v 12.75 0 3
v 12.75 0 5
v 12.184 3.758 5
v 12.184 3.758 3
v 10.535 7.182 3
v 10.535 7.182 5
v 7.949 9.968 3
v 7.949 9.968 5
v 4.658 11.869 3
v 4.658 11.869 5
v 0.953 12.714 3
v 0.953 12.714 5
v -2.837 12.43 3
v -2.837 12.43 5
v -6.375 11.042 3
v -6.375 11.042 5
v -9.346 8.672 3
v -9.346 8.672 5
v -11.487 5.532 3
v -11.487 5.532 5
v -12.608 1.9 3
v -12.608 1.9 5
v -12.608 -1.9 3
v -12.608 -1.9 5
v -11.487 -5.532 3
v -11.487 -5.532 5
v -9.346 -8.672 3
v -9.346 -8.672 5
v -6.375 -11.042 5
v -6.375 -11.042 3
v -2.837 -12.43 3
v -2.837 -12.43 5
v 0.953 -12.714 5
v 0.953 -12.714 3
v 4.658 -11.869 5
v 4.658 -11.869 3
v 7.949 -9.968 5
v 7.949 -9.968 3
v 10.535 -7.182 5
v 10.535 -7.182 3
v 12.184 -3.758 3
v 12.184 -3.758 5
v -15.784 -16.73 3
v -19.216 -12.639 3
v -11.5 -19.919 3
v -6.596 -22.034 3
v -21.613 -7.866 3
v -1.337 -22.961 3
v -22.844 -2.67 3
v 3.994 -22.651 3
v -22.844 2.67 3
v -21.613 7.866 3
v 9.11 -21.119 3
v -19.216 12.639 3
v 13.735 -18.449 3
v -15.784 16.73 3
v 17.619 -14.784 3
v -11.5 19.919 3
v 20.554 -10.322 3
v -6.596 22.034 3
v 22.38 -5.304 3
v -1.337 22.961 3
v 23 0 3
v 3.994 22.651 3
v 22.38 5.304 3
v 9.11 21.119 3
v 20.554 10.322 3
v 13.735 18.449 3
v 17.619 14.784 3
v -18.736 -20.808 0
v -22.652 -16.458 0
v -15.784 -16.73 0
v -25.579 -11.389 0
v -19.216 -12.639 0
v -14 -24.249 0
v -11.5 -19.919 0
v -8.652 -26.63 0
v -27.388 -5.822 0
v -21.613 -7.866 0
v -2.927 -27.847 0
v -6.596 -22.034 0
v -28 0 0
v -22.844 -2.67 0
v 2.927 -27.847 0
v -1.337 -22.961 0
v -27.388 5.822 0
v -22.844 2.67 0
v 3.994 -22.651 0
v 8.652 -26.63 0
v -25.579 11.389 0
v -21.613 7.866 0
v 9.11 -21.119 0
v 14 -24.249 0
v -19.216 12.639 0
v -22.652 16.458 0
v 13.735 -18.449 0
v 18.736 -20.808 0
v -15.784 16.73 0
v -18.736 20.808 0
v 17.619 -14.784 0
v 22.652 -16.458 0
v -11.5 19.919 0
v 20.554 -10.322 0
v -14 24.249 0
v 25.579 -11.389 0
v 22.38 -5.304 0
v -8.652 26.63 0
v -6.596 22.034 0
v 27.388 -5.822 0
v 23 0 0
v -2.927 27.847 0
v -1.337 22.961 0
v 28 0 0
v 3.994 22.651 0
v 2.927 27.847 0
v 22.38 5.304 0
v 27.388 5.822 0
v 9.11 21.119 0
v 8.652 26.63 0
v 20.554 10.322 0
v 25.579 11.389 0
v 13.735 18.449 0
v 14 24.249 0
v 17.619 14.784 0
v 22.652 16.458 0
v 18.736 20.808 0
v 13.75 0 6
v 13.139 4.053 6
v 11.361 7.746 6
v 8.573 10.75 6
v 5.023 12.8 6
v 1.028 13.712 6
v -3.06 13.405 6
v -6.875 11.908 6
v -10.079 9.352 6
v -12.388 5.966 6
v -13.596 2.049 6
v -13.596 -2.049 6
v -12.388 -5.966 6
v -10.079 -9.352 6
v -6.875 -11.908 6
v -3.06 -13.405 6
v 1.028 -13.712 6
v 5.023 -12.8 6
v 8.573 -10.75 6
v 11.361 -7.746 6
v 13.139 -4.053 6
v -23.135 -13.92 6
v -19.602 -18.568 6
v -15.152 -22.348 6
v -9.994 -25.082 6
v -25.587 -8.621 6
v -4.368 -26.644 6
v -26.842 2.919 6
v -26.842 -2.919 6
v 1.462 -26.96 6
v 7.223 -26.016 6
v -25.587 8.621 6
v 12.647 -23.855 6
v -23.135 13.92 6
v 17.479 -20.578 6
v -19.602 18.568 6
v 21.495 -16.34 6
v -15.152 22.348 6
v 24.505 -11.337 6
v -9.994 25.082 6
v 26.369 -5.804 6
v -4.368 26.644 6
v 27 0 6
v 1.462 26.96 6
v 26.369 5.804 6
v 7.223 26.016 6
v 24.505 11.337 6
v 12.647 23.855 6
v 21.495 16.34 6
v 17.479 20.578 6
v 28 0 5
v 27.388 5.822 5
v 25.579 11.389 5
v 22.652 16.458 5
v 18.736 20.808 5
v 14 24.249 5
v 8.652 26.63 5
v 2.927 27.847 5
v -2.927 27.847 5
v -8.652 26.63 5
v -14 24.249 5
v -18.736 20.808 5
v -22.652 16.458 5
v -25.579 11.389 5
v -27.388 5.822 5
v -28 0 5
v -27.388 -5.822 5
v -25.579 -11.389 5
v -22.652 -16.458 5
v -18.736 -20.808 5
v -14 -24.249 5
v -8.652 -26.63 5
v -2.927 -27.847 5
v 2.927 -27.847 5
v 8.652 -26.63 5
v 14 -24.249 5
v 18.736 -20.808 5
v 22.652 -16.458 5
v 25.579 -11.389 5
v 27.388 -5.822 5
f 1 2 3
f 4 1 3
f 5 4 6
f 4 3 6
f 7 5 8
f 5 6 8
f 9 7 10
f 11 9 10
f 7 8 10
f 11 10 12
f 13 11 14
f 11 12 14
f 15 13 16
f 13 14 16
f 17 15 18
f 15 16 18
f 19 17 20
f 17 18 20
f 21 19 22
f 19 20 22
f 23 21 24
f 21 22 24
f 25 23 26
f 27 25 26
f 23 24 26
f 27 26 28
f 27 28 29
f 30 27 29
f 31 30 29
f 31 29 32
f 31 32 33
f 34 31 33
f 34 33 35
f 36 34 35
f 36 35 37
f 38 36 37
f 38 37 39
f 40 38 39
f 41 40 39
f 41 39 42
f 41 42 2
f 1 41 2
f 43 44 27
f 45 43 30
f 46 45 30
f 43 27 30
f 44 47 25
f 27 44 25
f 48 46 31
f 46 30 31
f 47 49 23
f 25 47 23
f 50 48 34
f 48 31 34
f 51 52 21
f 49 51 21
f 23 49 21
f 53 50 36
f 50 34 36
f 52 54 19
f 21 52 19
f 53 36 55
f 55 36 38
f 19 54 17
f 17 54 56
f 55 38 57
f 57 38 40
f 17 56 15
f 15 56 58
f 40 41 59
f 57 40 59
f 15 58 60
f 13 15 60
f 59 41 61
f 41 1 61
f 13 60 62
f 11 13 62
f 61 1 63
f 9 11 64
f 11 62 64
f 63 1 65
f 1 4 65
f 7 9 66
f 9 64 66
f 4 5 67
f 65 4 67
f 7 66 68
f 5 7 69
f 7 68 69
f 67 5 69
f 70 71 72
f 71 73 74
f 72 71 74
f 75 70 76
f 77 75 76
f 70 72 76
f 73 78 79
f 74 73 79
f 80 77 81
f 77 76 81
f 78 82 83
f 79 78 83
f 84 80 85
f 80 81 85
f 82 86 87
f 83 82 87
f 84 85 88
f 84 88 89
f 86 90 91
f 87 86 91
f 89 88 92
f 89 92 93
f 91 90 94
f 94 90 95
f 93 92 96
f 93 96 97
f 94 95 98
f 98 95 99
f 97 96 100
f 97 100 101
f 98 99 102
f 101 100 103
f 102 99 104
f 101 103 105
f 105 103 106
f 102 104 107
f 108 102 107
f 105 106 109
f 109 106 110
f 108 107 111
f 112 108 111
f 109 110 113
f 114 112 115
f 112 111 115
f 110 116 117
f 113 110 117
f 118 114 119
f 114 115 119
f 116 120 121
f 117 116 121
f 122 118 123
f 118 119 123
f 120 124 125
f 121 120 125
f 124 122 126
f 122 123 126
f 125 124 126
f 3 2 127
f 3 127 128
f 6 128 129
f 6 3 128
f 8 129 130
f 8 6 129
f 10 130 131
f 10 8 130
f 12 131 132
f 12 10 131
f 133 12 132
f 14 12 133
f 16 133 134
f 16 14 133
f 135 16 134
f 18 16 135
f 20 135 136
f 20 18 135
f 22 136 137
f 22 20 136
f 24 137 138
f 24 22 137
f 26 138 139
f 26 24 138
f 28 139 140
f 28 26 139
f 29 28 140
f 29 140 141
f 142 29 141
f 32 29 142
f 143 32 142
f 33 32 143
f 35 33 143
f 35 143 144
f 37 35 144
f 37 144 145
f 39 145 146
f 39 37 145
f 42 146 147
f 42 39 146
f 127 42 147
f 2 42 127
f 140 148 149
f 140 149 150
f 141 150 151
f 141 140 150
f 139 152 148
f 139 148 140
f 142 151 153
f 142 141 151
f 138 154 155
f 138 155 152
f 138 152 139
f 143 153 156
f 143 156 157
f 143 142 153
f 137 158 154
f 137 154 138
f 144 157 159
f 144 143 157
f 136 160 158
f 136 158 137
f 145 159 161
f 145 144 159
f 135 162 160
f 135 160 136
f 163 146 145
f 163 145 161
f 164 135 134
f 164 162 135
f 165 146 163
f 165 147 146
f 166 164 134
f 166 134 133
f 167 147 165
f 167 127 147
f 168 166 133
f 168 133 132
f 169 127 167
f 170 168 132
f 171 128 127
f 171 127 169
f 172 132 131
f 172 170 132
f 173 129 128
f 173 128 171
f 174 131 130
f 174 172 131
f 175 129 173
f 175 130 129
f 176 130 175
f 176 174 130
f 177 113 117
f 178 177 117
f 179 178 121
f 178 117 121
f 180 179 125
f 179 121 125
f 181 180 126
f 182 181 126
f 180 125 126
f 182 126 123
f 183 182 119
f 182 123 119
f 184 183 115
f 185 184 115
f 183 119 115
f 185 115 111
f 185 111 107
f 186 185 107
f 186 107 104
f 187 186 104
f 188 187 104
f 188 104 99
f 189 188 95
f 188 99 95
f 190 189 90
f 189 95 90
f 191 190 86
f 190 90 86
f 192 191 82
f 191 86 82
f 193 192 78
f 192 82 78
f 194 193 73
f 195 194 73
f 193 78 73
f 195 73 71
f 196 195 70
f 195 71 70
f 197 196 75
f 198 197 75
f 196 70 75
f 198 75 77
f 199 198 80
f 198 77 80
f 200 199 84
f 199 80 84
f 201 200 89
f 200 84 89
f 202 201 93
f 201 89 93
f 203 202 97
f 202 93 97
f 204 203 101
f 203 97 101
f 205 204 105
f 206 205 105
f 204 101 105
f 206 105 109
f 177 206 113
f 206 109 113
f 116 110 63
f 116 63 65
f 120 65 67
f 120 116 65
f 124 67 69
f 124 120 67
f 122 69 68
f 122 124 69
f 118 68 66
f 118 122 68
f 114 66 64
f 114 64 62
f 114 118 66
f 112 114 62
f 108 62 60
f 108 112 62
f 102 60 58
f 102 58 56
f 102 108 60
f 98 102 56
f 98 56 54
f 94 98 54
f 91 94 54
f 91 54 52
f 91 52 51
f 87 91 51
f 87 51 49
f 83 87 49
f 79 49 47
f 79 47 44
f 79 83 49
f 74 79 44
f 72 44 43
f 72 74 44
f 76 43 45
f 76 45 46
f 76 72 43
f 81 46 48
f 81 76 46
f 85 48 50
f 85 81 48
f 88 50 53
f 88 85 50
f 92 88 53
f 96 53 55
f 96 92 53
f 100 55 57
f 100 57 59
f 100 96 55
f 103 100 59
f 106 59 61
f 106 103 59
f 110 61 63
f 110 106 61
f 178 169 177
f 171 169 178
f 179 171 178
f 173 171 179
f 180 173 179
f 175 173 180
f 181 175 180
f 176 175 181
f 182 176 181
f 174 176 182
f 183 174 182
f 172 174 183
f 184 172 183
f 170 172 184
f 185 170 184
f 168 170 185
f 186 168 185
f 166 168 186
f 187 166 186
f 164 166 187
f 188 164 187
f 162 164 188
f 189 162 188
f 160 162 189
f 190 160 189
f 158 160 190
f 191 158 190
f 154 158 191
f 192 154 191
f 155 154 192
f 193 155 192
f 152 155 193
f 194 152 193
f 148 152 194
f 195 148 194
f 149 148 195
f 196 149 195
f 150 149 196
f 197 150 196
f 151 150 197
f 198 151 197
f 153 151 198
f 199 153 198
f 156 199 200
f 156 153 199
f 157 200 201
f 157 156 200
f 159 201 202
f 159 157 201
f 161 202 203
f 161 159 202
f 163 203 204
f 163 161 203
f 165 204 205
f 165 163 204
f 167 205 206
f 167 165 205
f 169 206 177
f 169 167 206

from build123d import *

# Parameters (mm, degrees)
F0_R     = 28
F0_R_2   = 23
F1_DEPTH = 6
F2_DEPTH = 3
F3_R     = 12.75
F4_DEPTH = 6.001
F5_SIZE  = 1


with BuildPart() as f1:
    # F0 (on Top) → F1 (new body)
    with BuildSketch(Plane.XY):
        Circle(F0_R)
        Circle(F0_R_2, mode=Mode.SUBTRACT)
        Circle(F0_R_2)
    extrude(amount=F1_DEPTH)

    # F0 (on Top) → F2 (cut)
    with BuildSketch(Plane.XY):
        Circle(F0_R_2)
    extrude(amount=F2_DEPTH, mode=Mode.SUBTRACT)

    # F3 (on face) → F4 (cut, through all)
    with BuildSketch(Plane.XY.offset(6)):
        Circle(F3_R)
    extrude(amount=-F4_DEPTH, mode=Mode.SUBTRACT)

    # F5
    f5_edges = [f1.edges().sort_by_distance(p)[0] for p in [
        (-12.75, 0, 6),
        (-28, 0, 6),
    ]]
    chamfer(f5_edges, length=F5_SIZE)


solid = f1.part
